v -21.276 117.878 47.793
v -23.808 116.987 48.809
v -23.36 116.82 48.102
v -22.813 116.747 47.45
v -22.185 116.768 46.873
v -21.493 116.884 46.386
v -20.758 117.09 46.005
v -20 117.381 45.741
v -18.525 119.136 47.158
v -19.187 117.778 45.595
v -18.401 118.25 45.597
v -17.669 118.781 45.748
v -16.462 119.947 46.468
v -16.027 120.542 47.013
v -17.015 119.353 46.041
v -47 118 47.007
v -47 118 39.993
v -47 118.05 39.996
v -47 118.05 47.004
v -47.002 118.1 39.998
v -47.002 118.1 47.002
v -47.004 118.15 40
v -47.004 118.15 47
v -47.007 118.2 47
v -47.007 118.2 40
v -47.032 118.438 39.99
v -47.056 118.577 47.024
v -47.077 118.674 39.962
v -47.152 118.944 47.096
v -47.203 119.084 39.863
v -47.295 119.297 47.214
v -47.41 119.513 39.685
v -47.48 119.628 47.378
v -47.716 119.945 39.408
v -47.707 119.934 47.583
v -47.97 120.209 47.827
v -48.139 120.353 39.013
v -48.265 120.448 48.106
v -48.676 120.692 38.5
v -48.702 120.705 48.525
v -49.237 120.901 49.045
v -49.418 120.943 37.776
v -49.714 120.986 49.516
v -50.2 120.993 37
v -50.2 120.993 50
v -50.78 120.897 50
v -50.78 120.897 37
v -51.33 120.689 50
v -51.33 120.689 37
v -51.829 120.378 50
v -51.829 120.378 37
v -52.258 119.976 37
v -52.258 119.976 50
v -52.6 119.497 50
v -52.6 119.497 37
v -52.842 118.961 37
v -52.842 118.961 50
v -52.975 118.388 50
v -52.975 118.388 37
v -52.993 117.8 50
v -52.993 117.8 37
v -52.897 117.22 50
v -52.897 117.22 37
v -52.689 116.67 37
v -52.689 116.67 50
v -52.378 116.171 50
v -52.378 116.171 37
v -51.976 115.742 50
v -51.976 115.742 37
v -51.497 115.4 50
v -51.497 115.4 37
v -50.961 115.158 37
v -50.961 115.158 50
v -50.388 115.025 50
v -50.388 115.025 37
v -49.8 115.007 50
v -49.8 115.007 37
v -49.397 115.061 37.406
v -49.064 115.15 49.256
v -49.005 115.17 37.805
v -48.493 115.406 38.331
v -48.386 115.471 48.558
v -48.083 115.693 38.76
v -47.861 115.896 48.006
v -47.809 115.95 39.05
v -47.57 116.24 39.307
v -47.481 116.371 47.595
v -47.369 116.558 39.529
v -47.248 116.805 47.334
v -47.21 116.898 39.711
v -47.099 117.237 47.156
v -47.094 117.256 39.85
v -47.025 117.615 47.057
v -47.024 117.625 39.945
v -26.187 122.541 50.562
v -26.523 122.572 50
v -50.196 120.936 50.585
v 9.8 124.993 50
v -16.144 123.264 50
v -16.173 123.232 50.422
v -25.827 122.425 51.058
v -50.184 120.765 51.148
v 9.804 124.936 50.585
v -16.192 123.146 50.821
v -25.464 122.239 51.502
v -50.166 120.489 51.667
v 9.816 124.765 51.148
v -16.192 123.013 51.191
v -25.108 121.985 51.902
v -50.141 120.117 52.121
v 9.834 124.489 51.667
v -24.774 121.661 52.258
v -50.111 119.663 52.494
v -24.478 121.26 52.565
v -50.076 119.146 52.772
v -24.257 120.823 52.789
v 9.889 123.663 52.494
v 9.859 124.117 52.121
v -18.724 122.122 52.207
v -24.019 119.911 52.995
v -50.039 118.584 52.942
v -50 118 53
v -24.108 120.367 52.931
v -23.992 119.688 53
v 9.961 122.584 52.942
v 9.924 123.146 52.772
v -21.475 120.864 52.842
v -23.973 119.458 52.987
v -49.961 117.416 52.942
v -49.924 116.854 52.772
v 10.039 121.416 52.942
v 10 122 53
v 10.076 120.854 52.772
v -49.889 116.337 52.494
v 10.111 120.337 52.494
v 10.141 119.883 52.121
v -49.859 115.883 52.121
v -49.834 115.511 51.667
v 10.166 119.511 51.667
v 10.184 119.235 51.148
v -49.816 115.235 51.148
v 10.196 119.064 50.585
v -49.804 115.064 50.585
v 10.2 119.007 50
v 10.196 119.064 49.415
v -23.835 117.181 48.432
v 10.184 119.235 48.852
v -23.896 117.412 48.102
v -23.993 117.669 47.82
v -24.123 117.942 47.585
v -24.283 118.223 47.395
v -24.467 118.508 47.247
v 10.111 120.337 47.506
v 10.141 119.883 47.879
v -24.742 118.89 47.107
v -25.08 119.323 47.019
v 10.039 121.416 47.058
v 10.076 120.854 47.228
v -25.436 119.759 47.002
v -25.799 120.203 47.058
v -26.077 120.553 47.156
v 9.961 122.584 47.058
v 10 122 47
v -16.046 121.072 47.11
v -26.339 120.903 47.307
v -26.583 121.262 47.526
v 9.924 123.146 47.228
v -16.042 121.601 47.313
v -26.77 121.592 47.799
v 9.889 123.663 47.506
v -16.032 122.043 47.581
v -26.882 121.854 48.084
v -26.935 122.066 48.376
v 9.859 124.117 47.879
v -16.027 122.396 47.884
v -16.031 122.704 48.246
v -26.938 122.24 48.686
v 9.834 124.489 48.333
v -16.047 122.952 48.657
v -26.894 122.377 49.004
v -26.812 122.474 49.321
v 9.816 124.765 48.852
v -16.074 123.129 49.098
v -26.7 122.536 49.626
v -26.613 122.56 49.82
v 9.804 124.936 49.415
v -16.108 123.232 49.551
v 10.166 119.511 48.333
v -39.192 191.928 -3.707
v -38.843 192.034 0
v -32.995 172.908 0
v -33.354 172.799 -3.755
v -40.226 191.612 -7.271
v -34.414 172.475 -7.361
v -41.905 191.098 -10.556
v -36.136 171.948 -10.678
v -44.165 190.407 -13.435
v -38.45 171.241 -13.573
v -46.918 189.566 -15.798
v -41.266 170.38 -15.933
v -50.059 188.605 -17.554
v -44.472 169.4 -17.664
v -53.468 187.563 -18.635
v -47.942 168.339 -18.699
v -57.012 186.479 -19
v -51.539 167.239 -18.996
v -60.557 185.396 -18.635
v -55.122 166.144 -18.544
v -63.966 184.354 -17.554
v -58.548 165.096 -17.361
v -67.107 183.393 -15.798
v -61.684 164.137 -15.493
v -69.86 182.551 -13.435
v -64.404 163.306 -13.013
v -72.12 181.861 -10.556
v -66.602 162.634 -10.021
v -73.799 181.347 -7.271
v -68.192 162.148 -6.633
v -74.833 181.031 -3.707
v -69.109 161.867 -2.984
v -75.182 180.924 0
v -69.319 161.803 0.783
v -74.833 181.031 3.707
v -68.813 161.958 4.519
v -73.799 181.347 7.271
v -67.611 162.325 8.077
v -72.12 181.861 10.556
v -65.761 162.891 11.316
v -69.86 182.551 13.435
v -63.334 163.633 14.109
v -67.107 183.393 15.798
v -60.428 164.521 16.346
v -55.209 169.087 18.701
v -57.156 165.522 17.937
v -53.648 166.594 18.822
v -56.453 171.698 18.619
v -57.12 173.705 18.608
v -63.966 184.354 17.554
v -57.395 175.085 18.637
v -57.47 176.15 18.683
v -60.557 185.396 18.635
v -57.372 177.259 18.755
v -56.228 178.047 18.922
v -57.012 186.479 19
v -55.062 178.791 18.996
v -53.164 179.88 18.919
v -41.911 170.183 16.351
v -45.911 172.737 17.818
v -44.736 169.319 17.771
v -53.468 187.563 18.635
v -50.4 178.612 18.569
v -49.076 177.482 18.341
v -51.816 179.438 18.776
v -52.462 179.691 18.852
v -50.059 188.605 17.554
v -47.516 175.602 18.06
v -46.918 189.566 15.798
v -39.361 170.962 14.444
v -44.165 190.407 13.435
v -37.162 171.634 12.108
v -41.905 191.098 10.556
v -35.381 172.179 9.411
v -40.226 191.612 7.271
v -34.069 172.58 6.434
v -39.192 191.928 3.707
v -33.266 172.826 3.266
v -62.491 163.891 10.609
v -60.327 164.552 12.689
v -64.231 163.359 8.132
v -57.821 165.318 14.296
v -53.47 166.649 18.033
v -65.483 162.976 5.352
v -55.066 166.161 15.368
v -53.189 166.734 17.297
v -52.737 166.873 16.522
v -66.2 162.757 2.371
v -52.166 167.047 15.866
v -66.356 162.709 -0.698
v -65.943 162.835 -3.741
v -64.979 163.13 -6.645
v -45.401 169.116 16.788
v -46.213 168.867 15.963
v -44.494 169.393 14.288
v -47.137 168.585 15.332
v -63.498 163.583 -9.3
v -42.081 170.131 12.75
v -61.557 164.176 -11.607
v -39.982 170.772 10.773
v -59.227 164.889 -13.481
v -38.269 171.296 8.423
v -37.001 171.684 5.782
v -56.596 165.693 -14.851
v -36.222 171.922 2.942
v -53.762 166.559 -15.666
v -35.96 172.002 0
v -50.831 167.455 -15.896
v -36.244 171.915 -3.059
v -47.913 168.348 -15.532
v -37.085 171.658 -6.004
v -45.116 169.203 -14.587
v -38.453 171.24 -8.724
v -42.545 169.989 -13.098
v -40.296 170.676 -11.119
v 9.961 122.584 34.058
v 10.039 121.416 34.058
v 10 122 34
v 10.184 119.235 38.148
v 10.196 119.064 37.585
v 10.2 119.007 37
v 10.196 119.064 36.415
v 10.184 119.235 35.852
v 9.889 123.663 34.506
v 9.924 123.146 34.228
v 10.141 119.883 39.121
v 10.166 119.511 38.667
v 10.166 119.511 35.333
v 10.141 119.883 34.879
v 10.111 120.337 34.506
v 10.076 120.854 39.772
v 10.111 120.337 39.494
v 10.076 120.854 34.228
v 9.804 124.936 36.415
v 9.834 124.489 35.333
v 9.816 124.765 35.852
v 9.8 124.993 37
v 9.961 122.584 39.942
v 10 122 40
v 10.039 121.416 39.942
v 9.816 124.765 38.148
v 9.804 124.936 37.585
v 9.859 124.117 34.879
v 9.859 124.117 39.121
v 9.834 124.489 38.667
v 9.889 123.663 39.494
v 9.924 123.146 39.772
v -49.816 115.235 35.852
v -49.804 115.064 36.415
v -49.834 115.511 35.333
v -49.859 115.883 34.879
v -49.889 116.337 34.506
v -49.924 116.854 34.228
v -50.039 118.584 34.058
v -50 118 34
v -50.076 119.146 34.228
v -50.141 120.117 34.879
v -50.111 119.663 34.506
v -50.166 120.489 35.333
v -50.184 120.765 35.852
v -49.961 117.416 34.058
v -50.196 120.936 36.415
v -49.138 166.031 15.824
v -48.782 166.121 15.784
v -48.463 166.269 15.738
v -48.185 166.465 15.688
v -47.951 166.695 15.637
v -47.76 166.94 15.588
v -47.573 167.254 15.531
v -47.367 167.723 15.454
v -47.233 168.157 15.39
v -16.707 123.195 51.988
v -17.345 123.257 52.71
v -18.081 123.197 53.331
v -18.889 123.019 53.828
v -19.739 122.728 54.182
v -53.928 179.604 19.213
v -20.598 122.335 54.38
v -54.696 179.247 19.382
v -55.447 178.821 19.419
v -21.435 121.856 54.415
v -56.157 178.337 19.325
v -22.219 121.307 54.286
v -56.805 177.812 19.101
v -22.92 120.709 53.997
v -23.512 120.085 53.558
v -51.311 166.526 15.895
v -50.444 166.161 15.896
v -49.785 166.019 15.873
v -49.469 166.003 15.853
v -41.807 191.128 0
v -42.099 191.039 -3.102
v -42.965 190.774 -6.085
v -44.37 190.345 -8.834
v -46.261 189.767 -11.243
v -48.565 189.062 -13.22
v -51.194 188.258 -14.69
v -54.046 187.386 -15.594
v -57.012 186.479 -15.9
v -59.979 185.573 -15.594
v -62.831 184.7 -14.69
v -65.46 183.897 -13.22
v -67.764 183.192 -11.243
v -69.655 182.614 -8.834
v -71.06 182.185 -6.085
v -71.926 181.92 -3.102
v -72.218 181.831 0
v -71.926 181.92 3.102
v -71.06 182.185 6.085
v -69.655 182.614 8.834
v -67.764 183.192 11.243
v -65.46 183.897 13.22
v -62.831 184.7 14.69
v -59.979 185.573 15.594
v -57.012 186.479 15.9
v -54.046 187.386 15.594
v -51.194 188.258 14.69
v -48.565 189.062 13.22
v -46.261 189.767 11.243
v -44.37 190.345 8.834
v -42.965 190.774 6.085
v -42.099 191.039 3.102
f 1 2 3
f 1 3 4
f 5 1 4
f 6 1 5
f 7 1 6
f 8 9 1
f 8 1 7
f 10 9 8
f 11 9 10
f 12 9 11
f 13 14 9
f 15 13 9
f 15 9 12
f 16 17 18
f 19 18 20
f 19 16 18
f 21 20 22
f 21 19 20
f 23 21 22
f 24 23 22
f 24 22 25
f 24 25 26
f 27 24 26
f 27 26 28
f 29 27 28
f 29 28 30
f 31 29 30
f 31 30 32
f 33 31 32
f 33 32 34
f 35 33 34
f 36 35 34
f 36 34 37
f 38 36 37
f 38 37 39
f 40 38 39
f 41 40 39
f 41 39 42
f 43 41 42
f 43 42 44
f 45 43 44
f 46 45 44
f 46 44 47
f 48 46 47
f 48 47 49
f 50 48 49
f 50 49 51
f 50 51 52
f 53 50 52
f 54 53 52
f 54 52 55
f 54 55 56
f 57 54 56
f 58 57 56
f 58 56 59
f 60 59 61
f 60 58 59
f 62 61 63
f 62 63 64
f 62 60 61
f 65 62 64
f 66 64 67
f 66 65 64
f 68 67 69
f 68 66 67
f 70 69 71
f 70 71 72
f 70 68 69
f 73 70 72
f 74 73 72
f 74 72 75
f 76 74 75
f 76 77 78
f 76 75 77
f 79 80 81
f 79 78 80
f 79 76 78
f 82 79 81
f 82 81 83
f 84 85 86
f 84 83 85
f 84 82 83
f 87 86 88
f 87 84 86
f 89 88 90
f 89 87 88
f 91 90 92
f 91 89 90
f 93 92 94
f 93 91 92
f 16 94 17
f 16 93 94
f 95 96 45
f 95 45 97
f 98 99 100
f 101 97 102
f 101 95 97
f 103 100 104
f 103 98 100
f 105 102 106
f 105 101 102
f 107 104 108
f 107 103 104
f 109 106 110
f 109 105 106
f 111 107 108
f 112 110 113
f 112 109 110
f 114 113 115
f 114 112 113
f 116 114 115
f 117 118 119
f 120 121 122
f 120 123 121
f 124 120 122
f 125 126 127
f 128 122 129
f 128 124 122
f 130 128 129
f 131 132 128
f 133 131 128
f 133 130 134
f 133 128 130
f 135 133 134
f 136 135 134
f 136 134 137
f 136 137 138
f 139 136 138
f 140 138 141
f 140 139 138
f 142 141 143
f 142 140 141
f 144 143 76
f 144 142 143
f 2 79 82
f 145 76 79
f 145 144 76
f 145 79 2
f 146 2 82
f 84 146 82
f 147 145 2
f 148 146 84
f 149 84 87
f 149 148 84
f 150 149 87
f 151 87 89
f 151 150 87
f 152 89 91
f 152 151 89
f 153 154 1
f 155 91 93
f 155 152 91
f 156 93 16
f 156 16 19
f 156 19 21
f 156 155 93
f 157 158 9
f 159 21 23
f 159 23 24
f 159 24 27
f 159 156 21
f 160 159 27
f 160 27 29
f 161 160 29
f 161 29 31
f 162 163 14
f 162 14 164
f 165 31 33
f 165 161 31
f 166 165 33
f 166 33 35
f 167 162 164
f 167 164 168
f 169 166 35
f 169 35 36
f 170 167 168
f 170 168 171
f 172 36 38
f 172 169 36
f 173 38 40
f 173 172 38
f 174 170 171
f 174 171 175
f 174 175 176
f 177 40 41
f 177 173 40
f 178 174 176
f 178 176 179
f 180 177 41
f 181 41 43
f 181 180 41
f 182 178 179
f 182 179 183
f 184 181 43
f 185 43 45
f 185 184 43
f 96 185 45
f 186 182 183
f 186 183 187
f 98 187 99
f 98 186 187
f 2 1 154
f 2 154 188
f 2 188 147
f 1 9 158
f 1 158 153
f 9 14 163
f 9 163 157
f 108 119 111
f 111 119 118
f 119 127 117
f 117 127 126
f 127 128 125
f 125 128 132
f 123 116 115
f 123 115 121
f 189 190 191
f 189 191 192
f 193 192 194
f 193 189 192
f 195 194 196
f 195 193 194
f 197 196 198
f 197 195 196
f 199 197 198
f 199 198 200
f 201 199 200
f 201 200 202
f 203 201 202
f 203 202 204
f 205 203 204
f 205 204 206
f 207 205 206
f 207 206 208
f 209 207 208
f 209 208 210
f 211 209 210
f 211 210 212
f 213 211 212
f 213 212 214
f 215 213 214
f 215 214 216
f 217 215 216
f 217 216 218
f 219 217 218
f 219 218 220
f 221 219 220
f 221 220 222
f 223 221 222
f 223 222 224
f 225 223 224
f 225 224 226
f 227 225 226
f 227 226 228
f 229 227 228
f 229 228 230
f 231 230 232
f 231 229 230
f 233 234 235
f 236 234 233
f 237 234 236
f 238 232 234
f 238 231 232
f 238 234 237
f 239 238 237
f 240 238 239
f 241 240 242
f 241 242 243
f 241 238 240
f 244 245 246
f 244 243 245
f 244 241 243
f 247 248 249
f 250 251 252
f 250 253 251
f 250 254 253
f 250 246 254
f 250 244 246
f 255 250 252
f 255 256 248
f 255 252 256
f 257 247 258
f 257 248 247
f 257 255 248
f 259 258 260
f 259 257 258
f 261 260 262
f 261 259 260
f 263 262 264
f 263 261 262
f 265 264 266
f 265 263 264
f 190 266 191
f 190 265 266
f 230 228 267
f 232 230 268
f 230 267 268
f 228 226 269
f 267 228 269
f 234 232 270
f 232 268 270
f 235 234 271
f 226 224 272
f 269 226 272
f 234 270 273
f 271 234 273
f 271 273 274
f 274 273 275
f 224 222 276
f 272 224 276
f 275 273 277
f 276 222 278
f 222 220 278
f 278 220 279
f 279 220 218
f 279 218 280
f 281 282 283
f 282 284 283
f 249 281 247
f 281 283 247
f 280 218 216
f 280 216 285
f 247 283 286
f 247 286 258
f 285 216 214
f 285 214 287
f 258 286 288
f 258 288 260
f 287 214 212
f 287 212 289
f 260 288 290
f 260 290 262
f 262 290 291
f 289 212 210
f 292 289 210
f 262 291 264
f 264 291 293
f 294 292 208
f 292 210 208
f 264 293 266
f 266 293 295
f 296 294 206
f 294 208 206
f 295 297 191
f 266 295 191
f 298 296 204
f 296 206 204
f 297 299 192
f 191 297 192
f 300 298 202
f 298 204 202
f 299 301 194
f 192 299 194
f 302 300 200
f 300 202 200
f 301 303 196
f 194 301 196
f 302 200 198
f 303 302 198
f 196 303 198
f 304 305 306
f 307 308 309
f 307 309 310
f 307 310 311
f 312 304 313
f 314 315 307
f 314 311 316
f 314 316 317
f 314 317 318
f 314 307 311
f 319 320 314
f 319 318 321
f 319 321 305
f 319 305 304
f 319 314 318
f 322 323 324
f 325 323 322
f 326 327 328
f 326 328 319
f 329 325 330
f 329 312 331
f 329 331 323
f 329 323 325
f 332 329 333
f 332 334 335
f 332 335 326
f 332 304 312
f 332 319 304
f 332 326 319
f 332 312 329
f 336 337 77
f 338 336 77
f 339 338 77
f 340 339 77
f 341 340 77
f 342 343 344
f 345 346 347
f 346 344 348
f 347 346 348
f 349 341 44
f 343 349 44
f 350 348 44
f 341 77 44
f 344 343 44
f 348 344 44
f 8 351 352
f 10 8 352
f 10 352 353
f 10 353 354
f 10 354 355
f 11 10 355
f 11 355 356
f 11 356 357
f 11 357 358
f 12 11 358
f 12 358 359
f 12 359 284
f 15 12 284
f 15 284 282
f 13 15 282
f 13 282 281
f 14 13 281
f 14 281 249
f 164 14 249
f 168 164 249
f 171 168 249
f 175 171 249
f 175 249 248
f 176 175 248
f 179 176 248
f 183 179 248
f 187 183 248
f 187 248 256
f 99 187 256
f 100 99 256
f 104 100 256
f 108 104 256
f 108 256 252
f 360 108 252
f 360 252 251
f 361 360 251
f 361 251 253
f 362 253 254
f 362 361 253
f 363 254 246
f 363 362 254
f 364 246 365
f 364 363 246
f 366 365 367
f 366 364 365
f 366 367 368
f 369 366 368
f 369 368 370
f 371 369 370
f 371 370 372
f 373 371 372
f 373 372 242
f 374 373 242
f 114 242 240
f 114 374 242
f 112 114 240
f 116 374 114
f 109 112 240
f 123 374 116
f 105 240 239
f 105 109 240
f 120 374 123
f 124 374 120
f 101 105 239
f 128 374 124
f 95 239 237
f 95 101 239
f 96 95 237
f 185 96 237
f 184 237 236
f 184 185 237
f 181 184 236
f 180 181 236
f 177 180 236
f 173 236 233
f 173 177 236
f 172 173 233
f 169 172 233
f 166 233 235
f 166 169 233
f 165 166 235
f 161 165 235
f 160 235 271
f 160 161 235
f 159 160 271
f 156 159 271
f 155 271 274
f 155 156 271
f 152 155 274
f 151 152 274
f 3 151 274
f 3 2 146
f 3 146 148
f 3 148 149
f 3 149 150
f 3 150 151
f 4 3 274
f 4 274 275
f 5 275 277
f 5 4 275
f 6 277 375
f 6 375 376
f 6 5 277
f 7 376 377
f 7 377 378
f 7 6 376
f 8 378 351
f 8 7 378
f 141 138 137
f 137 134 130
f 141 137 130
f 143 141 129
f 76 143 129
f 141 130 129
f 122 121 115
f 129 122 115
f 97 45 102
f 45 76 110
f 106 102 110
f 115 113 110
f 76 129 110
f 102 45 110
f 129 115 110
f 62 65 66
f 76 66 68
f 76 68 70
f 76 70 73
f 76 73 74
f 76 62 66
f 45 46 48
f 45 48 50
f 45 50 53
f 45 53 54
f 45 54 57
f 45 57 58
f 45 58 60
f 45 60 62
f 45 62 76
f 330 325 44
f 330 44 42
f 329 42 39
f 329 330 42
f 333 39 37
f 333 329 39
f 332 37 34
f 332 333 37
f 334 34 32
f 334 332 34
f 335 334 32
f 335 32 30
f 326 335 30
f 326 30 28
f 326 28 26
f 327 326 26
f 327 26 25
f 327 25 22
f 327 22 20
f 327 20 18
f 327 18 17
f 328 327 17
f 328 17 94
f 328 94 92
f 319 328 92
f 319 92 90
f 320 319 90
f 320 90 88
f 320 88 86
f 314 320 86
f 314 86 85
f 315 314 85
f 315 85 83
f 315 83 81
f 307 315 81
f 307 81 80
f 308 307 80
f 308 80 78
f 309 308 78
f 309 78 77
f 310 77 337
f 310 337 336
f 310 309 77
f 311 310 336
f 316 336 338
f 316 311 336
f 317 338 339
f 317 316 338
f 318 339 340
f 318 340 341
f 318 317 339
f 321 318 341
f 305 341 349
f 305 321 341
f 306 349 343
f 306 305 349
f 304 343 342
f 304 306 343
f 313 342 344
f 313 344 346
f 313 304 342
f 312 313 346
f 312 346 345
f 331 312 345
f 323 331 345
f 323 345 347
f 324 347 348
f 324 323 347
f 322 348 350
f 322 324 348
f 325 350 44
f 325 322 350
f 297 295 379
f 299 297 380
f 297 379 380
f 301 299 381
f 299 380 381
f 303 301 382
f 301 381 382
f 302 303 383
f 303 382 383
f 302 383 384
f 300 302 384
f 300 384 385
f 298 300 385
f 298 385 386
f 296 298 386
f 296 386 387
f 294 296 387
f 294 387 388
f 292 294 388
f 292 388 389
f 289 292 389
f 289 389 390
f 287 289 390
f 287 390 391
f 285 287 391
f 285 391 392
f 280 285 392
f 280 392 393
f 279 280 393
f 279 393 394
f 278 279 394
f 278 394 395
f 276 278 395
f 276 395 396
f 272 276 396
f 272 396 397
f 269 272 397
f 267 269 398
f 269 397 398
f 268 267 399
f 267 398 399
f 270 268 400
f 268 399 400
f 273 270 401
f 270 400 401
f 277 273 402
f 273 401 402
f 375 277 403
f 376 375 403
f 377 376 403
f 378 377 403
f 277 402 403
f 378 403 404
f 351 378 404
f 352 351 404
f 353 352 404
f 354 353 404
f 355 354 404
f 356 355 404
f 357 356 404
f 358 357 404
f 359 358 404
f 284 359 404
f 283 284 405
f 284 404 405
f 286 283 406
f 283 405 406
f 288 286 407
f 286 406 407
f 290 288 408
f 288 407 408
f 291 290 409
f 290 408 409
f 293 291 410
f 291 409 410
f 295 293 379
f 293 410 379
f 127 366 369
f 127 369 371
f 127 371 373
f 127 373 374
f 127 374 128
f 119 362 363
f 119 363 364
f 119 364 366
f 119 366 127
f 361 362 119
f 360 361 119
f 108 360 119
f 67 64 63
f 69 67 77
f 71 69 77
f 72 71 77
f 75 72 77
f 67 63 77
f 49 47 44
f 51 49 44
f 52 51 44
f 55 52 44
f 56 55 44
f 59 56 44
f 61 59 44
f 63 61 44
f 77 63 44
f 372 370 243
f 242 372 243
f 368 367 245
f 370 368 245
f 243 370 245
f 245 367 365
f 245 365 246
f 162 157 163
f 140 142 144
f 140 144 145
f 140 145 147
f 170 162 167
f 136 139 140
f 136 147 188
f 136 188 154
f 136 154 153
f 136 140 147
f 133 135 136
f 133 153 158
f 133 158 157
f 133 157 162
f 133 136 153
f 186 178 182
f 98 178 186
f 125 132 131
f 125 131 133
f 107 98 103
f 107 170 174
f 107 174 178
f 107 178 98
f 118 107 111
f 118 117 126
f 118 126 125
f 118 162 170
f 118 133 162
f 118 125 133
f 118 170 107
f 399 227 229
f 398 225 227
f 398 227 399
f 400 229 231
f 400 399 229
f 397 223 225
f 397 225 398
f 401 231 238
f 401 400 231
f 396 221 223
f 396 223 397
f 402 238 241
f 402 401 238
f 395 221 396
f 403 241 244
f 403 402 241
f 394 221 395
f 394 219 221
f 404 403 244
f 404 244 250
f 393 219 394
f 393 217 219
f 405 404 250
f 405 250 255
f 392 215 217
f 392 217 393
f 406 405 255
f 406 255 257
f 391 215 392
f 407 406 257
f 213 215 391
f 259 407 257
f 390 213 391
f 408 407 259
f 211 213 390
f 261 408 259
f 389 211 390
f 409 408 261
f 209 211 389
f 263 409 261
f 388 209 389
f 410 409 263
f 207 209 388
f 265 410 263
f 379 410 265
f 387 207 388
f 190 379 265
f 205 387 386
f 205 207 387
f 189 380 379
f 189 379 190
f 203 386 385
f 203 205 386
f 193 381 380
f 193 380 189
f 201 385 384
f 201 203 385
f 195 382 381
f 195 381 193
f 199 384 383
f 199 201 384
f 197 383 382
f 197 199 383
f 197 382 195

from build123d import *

# Parameters (mm, degrees)
ABRAZADERA_PROFILE_R         = 19
BRAZO_PROFILE_R              = 5
PLACA_INT_PROFILE_R          = 3
PLACA_EXT_PROFILE_R          = 3
PUENTE_PLACAS_PROFILE_R      = 3
TALADRO_ABRAZADERA_PROFILE_R = 15.9


with BuildPart() as part:
    # Abrazadera: sweep along a curve in space
    with BuildLine() as abrazadera_path:
        Line((-51.165048326, 167.353332294, 0), (-57.012482421, 186.479427413, 0))
    # Abrazadera profile (on start of the path) → Abrazadera (sweep)
    with BuildSketch(Plane(origin=(-51.165048326, 167.353332294, 0), x_dir=(0.9563047559630354, 0.29237170472273677, 0), z_dir=(-0.29237170472273677, 0.9563047559630354, 0))):
        Circle(ABRAZADERA_PROFILE_R)
    sweep(path=abrazadera_path.line)

    # Brazo: sweep along a curve in space
    with BuildLine() as brazo_path:
        Line((-54.088765374, 176.916379853, 15), (-20, 120, 50))
    # Brazo profile (on start of the path) → Brazo (sweep)
    with BuildSketch(Plane(origin=(-54.088765374, 176.916379853, 15), x_dir=(0, -0.523820970586938, -0.851828381056512), z_dir=(0.45445554568660007, -0.7587826716841304, 0.4666037013854347))):
        Circle(BRAZO_PROFILE_R)
    sweep(path=brazo_path.line)

    # Placa_ext: sweep along a curve in space
    with BuildLine() as placa_ext_path:
        Line((-50, 118, 50), (10, 122, 50))
    # Placa_ext profile (on start of the path) → Placa_ext (sweep)
    with BuildSketch(Plane(origin=(-50, 118, 50), x_dir=(-0.06651901052377393, 0.9977851578566089, 0), z_dir=(0.9977851578566089, 0.06651901052377393, 0))):
        Circle(PLACA_EXT_PROFILE_R)
    sweep(path=placa_ext_path.line)



with BuildPart() as body_2:
    # Placa_int: sweep along a curve in space
    with BuildLine() as placa_int_path:
        Line((-50, 118, 37), (10, 122, 37))
    # Placa_int profile (on start of the path) → Placa_int (sweep)
    with BuildSketch(Plane(origin=(-50, 118, 37), x_dir=(-0.06651901052377393, 0.9977851578566089, 0), z_dir=(0.9977851578566089, 0.06651901052377393, 0))):
        Circle(PLACA_INT_PROFILE_R)
    sweep(path=placa_int_path.line)


with BuildPart() as part_1:
    add(part.part)

    add(body_2.part)  # Puente_placas merges body 2
    # Puente_placas: sweep along a curve in space
    with BuildLine() as puente_placas_path:
        Line((-50, 118, 37), (-50, 118, 50))
    # Puente_placas profile (on start of the path) → Puente_placas (sweep)
    with BuildSketch(Plane(origin=(-50, 118, 37), x_dir=(1, 0, 0), z_dir=(0, 0, 1))):
        Circle(PUENTE_PLACAS_PROFILE_R)
    sweep(path=puente_placas_path.line)

    # Taladro_abrazadera: sweep along a curve in space
    with BuildLine() as taladro_abrazadera_path:
        Line((-49.703189803, 162.571808514, 0), (-58.474340945, 191.260951193, 0))
    # Taladro_abrazadera profile (on start of the path) → Taladro_abrazadera (sweep, cut)
    with BuildSketch(Plane(origin=(-49.703189803, 162.571808514, 0), x_dir=(0.9563047559630354, 0.2923717047227367, 0), z_dir=(-0.2923717047227367, 0.9563047559630354, 0))):
        Circle(TALADRO_ABRAZADERA_PROFILE_R)
    sweep(path=taladro_abrazadera_path.line, mode=Mode.SUBTRACT)


solid = part_1.part
